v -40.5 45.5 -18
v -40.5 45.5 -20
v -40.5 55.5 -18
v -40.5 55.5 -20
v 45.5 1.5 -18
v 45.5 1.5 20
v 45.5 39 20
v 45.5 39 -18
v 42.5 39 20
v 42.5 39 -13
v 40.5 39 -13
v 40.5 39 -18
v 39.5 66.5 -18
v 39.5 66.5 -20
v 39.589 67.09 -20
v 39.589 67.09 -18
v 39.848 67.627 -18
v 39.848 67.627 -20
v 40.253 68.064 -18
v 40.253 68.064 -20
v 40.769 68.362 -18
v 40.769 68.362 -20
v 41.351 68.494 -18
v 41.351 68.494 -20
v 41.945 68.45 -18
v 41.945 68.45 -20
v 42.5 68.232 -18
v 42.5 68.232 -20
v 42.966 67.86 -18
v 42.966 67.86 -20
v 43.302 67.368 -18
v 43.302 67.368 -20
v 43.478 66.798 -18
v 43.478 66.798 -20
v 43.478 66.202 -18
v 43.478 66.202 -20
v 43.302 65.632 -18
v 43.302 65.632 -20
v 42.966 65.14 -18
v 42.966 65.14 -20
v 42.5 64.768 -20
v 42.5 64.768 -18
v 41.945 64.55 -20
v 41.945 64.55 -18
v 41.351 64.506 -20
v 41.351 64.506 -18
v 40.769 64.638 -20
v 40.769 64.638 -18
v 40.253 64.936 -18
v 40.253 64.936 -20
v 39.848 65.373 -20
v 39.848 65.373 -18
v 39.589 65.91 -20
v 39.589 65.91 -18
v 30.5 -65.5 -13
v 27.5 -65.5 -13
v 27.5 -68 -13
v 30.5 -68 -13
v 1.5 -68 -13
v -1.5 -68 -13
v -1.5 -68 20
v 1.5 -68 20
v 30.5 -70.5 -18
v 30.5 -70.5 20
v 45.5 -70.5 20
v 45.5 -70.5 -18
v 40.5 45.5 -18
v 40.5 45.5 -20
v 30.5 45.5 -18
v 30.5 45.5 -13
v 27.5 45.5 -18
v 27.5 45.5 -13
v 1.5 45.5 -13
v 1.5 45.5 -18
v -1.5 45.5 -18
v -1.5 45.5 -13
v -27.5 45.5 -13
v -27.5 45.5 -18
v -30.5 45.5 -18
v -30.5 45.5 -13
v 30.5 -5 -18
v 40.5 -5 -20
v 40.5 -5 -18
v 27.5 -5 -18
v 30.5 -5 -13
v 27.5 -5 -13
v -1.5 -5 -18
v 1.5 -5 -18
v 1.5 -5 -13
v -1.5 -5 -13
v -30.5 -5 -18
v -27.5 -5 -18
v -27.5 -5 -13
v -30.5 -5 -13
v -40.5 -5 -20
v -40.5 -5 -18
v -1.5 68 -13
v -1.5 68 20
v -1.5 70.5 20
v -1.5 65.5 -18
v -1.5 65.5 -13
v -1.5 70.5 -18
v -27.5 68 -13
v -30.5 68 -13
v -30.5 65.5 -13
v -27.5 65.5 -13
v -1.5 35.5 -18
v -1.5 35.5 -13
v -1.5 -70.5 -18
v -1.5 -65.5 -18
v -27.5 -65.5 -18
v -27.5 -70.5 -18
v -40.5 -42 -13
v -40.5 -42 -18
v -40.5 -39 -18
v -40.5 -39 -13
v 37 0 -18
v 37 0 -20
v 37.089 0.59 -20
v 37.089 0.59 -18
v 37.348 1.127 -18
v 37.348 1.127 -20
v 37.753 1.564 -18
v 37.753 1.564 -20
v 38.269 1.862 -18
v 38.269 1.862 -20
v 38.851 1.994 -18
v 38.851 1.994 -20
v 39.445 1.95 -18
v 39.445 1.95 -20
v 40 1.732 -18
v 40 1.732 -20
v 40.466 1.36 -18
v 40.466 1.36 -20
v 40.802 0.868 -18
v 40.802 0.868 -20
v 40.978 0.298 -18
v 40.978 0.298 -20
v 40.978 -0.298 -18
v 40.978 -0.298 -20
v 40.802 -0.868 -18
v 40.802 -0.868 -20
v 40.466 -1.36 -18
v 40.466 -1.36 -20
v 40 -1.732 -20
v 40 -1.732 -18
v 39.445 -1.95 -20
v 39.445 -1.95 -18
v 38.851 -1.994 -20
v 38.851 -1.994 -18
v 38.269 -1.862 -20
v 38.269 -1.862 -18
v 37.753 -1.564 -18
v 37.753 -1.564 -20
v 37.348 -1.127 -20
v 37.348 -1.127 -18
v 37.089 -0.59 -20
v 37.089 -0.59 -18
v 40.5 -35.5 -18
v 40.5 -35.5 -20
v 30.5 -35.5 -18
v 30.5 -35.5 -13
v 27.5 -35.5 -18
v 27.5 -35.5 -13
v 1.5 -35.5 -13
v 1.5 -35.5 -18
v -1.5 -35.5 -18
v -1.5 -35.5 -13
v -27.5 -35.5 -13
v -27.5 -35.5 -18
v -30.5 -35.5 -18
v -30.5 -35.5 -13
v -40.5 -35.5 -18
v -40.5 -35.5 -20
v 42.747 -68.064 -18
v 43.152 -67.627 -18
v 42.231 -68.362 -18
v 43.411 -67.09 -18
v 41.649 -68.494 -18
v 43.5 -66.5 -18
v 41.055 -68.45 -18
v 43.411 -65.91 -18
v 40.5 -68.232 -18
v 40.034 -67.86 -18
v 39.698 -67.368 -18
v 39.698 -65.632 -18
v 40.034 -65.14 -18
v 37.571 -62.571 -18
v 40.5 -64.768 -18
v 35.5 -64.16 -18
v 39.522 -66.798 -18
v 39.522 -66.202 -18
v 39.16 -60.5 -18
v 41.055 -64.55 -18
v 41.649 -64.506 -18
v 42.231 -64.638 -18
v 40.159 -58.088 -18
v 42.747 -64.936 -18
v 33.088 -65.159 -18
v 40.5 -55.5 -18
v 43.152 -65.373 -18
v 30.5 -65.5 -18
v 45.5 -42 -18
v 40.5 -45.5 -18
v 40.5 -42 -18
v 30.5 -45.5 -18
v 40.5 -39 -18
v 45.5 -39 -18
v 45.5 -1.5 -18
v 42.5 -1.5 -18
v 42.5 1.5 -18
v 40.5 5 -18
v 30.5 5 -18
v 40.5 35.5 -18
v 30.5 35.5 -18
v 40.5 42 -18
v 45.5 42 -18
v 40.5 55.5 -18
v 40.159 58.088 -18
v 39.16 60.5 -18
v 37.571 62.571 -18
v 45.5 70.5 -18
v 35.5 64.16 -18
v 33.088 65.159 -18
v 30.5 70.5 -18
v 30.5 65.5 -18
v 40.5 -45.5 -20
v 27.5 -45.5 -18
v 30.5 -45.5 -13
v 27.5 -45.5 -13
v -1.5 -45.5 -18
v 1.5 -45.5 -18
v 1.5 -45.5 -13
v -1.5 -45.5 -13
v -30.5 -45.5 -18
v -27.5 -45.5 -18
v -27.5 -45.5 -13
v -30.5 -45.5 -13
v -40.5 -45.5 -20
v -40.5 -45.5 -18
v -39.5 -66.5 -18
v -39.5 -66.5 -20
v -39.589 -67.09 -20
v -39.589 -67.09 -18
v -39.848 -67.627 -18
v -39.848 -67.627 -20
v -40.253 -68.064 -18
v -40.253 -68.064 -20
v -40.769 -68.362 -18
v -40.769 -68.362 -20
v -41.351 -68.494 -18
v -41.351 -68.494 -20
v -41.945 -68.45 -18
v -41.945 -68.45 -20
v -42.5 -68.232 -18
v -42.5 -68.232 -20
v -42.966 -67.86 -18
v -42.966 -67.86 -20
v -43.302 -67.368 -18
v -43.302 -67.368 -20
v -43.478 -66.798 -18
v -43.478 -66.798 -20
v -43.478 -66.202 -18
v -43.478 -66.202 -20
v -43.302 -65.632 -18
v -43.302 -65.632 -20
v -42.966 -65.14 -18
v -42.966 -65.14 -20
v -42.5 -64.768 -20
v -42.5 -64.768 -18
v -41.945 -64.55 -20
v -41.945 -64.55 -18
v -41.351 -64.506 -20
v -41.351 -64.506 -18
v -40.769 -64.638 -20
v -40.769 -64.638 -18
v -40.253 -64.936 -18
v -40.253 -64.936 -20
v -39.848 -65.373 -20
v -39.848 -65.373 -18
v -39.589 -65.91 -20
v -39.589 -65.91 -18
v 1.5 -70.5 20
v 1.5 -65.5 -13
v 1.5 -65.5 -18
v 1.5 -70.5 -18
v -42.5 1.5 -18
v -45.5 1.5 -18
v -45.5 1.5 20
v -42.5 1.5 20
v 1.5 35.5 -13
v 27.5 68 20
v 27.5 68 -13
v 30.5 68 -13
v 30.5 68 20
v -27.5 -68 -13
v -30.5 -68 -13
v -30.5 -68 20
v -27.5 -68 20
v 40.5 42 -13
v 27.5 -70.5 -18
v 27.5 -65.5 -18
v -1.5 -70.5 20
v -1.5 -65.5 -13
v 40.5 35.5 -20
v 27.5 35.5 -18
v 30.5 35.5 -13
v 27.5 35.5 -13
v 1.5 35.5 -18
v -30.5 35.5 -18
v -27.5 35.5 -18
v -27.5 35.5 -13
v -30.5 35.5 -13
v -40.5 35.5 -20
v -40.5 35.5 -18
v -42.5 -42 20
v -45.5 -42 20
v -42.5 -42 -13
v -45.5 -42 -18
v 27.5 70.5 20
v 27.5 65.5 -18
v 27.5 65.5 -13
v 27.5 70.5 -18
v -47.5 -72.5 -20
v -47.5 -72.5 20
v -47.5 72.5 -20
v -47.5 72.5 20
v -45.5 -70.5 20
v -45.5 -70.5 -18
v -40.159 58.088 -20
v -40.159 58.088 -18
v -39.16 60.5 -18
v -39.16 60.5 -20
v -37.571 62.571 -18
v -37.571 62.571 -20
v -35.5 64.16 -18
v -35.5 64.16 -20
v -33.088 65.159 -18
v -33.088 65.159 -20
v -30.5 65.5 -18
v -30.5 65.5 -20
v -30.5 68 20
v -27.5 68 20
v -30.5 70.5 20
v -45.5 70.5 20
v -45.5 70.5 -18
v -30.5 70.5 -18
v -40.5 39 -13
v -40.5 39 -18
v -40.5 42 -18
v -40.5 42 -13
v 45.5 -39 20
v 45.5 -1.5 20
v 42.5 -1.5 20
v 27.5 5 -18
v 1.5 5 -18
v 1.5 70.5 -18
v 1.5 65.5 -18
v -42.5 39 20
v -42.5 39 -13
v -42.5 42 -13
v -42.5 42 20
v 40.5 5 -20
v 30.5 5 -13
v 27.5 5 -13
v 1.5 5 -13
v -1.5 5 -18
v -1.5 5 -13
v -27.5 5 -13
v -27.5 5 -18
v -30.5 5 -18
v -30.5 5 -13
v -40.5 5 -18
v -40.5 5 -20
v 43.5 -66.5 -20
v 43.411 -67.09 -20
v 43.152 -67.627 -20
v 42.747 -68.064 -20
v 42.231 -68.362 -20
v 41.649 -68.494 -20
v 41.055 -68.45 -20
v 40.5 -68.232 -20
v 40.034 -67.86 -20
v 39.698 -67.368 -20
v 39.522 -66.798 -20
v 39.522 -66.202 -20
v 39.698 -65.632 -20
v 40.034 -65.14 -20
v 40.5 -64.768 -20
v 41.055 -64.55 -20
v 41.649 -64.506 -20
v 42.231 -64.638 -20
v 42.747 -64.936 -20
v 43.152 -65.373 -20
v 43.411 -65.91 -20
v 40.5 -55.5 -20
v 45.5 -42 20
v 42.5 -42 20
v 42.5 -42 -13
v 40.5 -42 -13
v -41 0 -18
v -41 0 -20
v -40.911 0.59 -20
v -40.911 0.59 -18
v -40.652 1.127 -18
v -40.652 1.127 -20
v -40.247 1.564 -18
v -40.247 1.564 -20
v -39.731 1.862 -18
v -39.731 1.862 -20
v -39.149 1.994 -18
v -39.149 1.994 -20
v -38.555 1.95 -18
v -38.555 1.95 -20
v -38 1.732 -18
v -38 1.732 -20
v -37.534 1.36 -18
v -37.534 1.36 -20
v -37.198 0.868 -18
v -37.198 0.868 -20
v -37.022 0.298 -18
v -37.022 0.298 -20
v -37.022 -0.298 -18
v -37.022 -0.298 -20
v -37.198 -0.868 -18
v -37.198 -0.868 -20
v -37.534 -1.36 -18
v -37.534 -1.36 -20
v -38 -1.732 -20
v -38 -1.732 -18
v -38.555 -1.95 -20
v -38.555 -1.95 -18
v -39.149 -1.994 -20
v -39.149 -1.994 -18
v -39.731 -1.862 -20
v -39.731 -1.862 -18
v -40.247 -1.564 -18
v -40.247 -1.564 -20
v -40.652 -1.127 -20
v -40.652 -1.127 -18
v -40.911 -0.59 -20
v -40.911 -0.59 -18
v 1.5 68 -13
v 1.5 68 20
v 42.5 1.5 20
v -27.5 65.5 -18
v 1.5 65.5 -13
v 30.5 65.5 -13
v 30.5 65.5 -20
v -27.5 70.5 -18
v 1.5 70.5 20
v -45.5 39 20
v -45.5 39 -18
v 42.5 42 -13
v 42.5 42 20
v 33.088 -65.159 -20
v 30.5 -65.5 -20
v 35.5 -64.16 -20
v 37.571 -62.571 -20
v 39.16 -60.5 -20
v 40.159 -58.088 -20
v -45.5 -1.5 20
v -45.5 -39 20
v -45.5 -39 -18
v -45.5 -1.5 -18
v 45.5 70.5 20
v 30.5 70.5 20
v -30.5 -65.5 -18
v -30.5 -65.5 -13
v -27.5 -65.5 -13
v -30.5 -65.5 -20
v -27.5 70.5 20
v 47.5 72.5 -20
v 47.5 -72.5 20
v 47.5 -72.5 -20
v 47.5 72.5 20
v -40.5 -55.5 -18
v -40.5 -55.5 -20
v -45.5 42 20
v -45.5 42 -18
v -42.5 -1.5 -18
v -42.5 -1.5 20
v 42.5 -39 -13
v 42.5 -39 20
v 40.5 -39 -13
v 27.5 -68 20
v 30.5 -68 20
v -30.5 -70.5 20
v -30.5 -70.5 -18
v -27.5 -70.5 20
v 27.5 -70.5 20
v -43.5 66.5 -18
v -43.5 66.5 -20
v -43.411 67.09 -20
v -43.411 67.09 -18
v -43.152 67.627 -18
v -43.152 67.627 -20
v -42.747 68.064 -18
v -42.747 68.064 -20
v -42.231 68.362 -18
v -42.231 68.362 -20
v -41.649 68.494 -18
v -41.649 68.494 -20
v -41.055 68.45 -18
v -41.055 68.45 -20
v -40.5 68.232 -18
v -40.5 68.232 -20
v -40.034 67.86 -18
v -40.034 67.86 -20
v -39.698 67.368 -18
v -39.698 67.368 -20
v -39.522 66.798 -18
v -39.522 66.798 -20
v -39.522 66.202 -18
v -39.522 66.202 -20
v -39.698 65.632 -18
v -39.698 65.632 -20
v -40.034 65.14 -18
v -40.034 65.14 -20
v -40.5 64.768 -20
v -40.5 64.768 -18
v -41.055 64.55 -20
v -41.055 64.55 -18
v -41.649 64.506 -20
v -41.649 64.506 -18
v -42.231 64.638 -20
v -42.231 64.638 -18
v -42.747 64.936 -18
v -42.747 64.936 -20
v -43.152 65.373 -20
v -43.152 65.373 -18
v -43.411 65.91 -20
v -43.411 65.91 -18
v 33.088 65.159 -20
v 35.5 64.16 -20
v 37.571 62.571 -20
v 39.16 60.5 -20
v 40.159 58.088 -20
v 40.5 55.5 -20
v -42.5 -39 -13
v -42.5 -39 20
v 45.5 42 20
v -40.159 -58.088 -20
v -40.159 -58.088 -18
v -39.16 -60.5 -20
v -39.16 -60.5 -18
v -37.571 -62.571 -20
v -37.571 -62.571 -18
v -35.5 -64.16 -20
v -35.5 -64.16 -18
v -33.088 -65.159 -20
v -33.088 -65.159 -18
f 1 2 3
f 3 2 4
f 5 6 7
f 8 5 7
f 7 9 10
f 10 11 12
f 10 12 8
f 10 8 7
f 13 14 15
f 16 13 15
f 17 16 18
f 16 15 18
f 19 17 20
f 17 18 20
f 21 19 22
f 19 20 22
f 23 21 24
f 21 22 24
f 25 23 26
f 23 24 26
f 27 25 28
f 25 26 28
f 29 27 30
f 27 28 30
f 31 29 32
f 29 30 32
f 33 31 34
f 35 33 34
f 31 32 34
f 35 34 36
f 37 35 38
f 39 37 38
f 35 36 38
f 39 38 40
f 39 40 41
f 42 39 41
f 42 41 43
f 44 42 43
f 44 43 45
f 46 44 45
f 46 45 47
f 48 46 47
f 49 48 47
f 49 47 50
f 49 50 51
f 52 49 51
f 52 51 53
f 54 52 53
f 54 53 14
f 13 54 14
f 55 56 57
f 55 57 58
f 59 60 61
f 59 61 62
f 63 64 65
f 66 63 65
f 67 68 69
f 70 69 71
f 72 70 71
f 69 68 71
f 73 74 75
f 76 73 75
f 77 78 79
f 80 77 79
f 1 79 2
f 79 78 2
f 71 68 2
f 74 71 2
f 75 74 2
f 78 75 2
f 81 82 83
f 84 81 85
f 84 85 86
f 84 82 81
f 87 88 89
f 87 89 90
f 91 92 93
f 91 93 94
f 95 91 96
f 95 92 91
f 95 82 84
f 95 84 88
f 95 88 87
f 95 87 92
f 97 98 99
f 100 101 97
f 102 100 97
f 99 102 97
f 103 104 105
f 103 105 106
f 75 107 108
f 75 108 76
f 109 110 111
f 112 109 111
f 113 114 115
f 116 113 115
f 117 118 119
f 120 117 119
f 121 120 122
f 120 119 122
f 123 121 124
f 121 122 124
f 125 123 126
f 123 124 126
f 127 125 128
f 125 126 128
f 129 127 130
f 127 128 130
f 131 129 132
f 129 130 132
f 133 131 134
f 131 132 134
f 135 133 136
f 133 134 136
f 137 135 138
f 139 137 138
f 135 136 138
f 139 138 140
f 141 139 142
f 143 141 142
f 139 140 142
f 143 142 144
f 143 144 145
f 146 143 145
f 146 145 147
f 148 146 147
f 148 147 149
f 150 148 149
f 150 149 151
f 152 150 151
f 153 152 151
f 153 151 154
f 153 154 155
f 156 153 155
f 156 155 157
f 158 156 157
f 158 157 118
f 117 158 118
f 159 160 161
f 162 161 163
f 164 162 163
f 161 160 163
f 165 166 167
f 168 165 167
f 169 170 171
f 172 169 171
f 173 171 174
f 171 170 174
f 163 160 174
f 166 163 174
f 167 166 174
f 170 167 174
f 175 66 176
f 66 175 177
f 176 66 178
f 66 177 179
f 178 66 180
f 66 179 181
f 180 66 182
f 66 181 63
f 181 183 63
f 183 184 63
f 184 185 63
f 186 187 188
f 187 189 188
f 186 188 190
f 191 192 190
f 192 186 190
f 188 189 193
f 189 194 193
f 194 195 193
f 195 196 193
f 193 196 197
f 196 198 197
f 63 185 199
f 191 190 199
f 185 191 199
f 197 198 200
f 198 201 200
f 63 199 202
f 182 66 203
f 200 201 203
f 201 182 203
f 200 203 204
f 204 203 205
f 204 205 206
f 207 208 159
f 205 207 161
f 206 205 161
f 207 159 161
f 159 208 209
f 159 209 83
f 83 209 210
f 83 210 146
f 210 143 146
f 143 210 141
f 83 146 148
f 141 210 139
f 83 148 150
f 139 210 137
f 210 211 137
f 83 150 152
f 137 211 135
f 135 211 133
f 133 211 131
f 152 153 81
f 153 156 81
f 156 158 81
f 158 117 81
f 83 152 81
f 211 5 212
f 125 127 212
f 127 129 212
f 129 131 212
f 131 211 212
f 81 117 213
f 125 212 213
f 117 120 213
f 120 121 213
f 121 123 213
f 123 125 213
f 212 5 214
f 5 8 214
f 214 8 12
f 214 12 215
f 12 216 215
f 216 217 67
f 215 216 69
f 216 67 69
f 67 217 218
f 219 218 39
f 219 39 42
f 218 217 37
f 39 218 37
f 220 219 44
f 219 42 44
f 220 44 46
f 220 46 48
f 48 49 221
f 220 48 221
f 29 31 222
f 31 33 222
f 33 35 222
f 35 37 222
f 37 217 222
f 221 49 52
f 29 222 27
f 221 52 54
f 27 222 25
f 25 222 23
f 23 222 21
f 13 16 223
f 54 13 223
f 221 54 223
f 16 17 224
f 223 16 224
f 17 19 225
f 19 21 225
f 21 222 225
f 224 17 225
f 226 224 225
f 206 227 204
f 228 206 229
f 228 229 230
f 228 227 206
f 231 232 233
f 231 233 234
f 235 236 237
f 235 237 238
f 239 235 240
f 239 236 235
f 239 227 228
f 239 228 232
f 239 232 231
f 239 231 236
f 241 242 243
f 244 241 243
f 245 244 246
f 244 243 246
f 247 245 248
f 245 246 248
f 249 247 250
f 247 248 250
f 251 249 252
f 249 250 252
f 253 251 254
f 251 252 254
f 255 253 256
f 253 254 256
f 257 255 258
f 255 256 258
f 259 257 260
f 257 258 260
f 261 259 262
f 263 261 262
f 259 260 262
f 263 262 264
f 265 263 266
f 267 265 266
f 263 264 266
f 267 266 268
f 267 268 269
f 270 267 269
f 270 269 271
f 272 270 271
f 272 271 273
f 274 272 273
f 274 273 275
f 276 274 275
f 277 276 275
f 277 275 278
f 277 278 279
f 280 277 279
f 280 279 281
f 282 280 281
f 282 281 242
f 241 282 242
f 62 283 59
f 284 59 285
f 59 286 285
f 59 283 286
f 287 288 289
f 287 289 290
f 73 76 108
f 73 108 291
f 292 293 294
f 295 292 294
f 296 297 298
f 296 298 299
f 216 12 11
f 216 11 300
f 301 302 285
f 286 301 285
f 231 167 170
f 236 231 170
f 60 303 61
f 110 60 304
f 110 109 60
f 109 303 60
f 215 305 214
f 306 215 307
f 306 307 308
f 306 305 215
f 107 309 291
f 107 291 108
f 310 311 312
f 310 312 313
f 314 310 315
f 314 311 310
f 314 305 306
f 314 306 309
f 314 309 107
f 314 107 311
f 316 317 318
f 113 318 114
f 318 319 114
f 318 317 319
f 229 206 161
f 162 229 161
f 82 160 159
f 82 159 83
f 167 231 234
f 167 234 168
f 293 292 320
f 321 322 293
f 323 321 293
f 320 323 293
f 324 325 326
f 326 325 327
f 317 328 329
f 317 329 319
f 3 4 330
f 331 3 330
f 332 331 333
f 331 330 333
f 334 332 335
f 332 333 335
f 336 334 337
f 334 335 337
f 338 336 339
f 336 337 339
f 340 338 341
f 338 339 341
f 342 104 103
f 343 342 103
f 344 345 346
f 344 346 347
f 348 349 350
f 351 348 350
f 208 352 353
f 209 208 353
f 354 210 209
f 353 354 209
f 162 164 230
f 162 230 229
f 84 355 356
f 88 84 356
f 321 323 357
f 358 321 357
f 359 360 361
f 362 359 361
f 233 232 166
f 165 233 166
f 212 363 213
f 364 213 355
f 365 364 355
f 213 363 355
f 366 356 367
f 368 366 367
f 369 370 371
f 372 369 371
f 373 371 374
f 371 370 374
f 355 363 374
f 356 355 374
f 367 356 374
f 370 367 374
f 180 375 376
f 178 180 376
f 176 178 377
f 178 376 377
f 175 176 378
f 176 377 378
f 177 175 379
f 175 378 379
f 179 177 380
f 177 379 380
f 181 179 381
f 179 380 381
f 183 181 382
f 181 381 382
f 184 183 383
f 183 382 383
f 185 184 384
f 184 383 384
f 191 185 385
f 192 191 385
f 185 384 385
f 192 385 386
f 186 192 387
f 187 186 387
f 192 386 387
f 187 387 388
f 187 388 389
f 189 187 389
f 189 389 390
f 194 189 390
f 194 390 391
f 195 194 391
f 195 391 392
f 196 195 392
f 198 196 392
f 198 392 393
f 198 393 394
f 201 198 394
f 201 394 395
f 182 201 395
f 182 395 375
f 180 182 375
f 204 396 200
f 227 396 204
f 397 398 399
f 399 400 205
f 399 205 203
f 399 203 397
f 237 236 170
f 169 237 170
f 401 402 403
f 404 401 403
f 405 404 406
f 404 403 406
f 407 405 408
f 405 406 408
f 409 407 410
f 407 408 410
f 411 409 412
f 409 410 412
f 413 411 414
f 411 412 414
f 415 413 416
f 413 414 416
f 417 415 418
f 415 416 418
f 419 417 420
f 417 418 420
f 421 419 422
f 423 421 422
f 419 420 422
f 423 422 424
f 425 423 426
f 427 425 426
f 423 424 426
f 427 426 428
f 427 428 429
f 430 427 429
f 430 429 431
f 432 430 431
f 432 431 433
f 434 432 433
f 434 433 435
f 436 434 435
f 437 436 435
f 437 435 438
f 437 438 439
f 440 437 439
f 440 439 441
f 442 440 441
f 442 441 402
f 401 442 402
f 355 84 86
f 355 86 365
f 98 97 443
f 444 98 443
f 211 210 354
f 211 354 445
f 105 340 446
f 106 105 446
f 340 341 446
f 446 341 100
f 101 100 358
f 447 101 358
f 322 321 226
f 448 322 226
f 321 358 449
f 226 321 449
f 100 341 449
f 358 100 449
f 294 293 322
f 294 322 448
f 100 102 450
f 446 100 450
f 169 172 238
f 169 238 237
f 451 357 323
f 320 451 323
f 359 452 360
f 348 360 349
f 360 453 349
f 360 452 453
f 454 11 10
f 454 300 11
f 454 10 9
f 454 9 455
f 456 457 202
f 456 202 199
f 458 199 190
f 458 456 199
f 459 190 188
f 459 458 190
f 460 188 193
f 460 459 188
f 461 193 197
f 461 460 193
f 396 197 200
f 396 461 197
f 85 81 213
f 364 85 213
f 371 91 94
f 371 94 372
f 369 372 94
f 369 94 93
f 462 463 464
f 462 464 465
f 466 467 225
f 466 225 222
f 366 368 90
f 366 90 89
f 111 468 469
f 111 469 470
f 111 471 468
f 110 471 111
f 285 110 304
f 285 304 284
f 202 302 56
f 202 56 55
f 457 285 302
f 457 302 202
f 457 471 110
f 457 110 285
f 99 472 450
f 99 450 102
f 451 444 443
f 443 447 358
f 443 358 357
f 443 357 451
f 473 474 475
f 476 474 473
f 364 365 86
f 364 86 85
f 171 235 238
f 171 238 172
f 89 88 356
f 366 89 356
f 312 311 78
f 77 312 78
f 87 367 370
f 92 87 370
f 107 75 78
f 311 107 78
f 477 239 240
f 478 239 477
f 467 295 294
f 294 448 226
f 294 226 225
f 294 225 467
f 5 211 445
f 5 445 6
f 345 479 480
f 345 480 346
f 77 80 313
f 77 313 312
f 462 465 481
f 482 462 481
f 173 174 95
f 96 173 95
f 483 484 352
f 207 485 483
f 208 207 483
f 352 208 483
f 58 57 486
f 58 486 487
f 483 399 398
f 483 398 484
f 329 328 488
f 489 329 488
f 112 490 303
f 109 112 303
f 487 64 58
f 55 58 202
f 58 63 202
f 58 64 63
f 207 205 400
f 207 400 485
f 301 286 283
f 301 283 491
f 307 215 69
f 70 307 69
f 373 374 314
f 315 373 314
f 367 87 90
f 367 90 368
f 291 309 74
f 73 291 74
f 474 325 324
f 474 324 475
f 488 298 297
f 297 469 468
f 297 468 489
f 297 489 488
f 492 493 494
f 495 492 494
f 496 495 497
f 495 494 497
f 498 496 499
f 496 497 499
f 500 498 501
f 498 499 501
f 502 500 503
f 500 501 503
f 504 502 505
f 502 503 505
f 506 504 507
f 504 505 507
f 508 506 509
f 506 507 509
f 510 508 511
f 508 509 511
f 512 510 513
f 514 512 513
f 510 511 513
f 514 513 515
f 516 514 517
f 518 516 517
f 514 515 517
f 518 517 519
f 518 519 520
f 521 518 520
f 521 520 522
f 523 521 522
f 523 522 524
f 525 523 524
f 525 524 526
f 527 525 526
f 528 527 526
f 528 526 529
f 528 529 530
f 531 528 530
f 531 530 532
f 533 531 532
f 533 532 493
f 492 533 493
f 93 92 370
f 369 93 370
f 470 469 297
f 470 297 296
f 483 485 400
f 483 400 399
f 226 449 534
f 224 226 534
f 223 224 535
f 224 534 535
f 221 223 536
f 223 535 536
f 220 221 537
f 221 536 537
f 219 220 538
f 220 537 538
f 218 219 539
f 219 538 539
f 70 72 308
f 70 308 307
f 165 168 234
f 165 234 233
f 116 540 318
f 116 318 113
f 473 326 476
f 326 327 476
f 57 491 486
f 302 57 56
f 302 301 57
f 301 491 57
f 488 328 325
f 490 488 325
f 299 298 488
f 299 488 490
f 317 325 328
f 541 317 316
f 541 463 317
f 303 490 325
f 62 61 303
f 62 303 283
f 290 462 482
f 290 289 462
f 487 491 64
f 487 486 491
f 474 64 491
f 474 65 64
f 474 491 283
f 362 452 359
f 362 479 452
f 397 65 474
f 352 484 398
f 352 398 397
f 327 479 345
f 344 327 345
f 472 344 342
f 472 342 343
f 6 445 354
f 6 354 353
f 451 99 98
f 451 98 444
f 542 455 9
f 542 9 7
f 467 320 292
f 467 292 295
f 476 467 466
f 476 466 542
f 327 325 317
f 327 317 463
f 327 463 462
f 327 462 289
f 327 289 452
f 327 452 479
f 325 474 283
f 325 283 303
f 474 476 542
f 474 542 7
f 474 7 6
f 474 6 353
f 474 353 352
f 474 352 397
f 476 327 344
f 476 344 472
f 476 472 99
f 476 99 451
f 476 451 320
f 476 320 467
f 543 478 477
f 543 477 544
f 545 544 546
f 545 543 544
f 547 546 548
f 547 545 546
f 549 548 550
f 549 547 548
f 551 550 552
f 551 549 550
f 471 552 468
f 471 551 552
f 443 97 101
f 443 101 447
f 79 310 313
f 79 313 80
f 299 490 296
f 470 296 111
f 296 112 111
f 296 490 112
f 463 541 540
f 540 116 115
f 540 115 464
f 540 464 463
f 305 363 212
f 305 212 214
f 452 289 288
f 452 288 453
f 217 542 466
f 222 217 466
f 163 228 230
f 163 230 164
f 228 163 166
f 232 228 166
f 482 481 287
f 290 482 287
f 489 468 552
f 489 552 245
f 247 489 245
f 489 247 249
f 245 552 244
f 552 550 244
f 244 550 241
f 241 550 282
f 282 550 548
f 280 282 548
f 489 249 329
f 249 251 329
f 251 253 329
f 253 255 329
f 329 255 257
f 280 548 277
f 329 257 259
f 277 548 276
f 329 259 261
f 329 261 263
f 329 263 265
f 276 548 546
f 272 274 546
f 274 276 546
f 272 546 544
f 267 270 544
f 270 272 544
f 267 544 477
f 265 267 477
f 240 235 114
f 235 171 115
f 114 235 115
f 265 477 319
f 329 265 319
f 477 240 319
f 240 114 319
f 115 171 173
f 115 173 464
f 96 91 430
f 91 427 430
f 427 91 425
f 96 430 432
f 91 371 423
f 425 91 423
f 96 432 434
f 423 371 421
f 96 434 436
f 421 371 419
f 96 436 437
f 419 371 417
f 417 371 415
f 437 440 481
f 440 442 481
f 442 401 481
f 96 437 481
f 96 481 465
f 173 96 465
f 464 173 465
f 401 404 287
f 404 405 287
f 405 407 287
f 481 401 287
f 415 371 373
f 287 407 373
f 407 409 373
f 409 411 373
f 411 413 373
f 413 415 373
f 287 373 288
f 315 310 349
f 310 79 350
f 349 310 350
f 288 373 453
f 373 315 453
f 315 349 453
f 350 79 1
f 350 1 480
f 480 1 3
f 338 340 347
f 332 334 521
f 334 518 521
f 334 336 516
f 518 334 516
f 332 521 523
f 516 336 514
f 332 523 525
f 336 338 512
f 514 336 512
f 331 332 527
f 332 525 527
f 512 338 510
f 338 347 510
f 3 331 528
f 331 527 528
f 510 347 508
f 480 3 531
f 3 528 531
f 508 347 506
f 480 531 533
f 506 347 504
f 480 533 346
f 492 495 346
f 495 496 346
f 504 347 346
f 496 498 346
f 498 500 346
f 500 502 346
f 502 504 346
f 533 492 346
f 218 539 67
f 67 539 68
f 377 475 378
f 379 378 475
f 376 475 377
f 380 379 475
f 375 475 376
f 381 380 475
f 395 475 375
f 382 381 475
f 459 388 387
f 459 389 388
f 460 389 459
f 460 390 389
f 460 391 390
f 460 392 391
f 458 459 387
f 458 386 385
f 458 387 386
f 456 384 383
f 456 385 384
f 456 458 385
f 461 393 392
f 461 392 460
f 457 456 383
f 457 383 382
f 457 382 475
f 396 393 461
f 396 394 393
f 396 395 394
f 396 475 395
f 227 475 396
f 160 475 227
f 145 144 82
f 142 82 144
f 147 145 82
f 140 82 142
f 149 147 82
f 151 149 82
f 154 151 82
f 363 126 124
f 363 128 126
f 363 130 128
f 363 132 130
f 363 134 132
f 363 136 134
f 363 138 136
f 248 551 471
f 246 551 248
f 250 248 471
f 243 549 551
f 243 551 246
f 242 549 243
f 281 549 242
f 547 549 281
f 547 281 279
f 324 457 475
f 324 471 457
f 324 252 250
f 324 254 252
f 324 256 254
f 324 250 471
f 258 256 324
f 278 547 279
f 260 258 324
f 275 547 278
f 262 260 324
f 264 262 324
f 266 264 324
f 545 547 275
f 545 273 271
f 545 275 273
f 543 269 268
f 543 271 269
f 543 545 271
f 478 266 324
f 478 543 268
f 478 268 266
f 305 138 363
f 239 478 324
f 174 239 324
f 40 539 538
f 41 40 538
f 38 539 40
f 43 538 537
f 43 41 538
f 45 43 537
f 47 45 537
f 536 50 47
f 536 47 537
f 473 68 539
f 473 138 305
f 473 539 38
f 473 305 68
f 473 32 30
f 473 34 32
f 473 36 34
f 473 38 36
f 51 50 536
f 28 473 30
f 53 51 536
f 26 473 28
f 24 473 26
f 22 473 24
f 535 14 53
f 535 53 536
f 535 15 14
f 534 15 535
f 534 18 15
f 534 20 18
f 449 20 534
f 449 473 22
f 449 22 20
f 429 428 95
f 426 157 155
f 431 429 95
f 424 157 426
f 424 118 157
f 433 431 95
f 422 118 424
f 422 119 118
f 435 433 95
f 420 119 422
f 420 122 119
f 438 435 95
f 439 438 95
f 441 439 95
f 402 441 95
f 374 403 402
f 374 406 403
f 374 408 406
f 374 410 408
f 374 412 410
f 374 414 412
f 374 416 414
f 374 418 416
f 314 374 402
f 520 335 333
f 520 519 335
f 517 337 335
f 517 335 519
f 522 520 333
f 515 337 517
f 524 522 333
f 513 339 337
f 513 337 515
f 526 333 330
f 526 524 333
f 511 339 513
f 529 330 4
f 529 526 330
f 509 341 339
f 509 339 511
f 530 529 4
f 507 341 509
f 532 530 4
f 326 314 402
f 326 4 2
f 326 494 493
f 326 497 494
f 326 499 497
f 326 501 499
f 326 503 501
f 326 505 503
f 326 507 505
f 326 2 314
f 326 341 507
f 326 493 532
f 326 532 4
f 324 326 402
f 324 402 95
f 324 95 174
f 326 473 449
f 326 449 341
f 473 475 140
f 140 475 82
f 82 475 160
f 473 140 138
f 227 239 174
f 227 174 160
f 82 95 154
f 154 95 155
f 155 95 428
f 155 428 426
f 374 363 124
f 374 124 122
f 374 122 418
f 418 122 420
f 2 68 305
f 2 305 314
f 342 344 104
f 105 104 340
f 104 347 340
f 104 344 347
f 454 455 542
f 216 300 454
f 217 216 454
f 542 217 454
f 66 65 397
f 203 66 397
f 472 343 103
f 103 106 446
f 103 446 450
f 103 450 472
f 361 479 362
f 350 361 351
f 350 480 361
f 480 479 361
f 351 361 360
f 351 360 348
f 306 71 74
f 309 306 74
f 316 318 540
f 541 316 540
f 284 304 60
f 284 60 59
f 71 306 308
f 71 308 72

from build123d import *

# Parameters (mm, degrees)
SKETCH1_W           = 95
SKETCH1_H           = 145
BOSS_EXTRUDE1_DEPTH = 20
SKETCH2_W           = 91
SKETCH2_H           = 141
CUT_EXTRUDE1_DEPTH  = 40
SKETCH3_W           = 91
SKETCH3_H           = 141
SKETCH3_W_2         = 81
SKETCH3_H_2         = 30.5
BOSS_EXTRUDE2_DEPTH = 2
CUT_EXTRUDE2_REACH  = 97.459
SKETCH4_R           = 2
SKETCH6_W           = 3
SKETCH6_H           = 2.5
SKETCH6_H_2         = 3
SKETCH6_W_2         = 2
SKETCH6_H_3         = 10
BOSS_EXTRUDE3_DEPTH = 5
SKETCH7_W           = 3
SKETCH7_H           = 3
SKETCH7_H_2         = 2.5
BOSS_EXTRUDE4_DEPTH = 33


with BuildPart() as part:
    # Sketch1 → Boss-Extrude1 (new, symmetric)
    with BuildSketch(Plane.XY):
        Rectangle(SKETCH1_W, SKETCH1_H)
    extrude(amount=BOSS_EXTRUDE1_DEPTH, both=True)

    # Sketch2 → Cut-Extrude1 (cut)
    with BuildSketch(Plane.XY.offset(20)):
        Rectangle(SKETCH2_W, SKETCH2_H)
    extrude(amount=-CUT_EXTRUDE1_DEPTH, mode=Mode.SUBTRACT)

    # Sketch3 → Boss-Extrude2 (add)
    with BuildSketch(Plane(origin=(0, 0, -20), x_dir=(-1, 0, 0), z_dir=(0, 0, -1))):
        Rectangle(SKETCH3_W, SKETCH3_H)
        with Locations((0, -20.25)):
            Rectangle(SKETCH3_W_2, SKETCH3_H_2, mode=Mode.SUBTRACT)
        with BuildLine():
            Line((-40.5, -45.5), (40.5, -45.5))
            Line((40.5, -45.5), (40.5, -55.5))
            ThreePointArc((40.5, -55.5), (37.571067812, -62.571067812), (30.5, -65.5))
            Line((30.5, -65.5), (-30.5, -65.5))
            ThreePointArc((-30.5, -65.5), (-37.571067812, -62.571067812), (-40.5, -55.5))
            Line((-40.5, -55.5), (-40.5, -45.5))
        make_face(mode=Mode.SUBTRACT)
        with Locations((0, 20.25)):
            Rectangle(SKETCH3_W_2, SKETCH3_H_2, mode=Mode.SUBTRACT)
        with BuildLine():
            Line((30.5, 65.5), (-30.5, 65.5))
            ThreePointArc((-30.5, 65.5), (-37.571067812, 62.571067812), (-40.5, 55.5))
            Line((-40.5, 55.5), (-40.5, 45.5))
            Line((-40.5, 45.5), (40.5, 45.5))
            Line((40.5, 45.5), (40.5, 55.5))
            ThreePointArc((40.5, 55.5), (37.571067812, 62.571067812), (30.5, 65.5))
        make_face(mode=Mode.SUBTRACT)
    extrude(amount=-BOSS_EXTRUDE2_DEPTH)

    # Sketch4 → Cut-Extrude2 (cut, up to next)
    with BuildSketch(Plane(origin=(0, 0, -20), x_dir=(-1, 0, 0), z_dir=(0, 0, -1)), mode=Mode.PRIVATE) as cut_extrude2_sk1:
        with Locations((-41.5, 66.5)):
            Circle(SKETCH4_R)
    cut_extrude2_tool1 = extrude(cut_extrude2_sk1.sketch, amount=-CUT_EXTRUDE2_REACH, mode=Mode.PRIVATE) & part.part
    # Sketch4 → Cut-Extrude2 (cut, up to next)
    with BuildSketch(Plane(origin=(0, 0, -20), x_dir=(-1, 0, 0), z_dir=(0, 0, -1)), mode=Mode.PRIVATE) as cut_extrude2_sk2:
        with Locations((41.5, 66.5)):
            Circle(SKETCH4_R)
    cut_extrude2_tool2 = extrude(cut_extrude2_sk2.sketch, amount=-CUT_EXTRUDE2_REACH, mode=Mode.PRIVATE) & part.part
    # Sketch4 → Cut-Extrude2 (cut, up to next)
    with BuildSketch(Plane(origin=(0, 0, -20), x_dir=(-1, 0, 0), z_dir=(0, 0, -1)), mode=Mode.PRIVATE) as cut_extrude2_sk3:
        with Locations(Location((41.5, -66.5, 0), (0, 0, 180))):
            Circle(SKETCH4_R)
    cut_extrude2_tool3 = extrude(cut_extrude2_sk3.sketch, amount=-CUT_EXTRUDE2_REACH, mode=Mode.PRIVATE) & part.part
    # Sketch4 → Cut-Extrude2 (cut, up to next)
    with BuildSketch(Plane(origin=(0, 0, -20), x_dir=(-1, 0, 0), z_dir=(0, 0, -1)), mode=Mode.PRIVATE) as cut_extrude2_sk4:
        with Locations(Location((-41.5, -66.5, 0), (0, 0, 180))):
            Circle(SKETCH4_R)
    cut_extrude2_tool4 = extrude(cut_extrude2_sk4.sketch, amount=-CUT_EXTRUDE2_REACH, mode=Mode.PRIVATE) & part.part
    # Sketch4 → Cut-Extrude2 (cut, up to next)
    with BuildSketch(Plane(origin=(0, 0, -20), x_dir=(-1, 0, 0), z_dir=(0, 0, -1)), mode=Mode.PRIVATE) as cut_extrude2_sk5:
        with Locations((-39, 0)):
            Circle(SKETCH4_R)
    cut_extrude2_tool5 = extrude(cut_extrude2_sk5.sketch, amount=-CUT_EXTRUDE2_REACH, mode=Mode.PRIVATE) & part.part
    # Sketch4 → Cut-Extrude2 (cut, up to next)
    with BuildSketch(Plane(origin=(0, 0, -20), x_dir=(-1, 0, 0), z_dir=(0, 0, -1)), mode=Mode.PRIVATE) as cut_extrude2_sk6:
        with Locations((39, 0)):
            Circle(SKETCH4_R)
    cut_extrude2_tool6 = extrude(cut_extrude2_sk6.sketch, amount=-CUT_EXTRUDE2_REACH, mode=Mode.PRIVATE) & part.part
    add(cut_extrude2_tool1.solids().sort_by_distance((41.5, 66.5, -20))[0], mode=Mode.SUBTRACT)
    add(cut_extrude2_tool2.solids().sort_by_distance((-41.5, 66.5, -20))[0], mode=Mode.SUBTRACT)
    add(cut_extrude2_tool3.solids().sort_by_distance((-41.5, -66.5, -20))[0], mode=Mode.SUBTRACT)
    add(cut_extrude2_tool4.solids().sort_by_distance((41.5, -66.5, -20))[0], mode=Mode.SUBTRACT)
    add(cut_extrude2_tool5.solids().sort_by_distance((39, 0, -20))[0], mode=Mode.SUBTRACT)
    add(cut_extrude2_tool6.solids().sort_by_distance((-39, 0, -20))[0], mode=Mode.SUBTRACT)

    # Sketch6 → Boss-Extrude3 (add)
    with BuildSketch(Plane.XY.offset(-18)):
        with Locations((-29, 69.25)):
            Rectangle(SKETCH6_W, SKETCH6_H)
        with Locations((-29, 66.75)):
            Rectangle(SKETCH6_W, SKETCH6_H)
        with Locations((0, 66.75)):
            Rectangle(SKETCH6_W, SKETCH6_H)
        with Locations((0, 69.25)):
            Rectangle(SKETCH6_W, SKETCH6_H)
        with Locations((29, 69.25)):
            Rectangle(SKETCH6_W, SKETCH6_H)
        with Locations((29, 66.75)):
            Rectangle(SKETCH6_W, SKETCH6_H)
        with Locations((44, 40.5)):
            Rectangle(SKETCH6_W, SKETCH6_H_2)
        with Locations((41.5, 40.5)):
            Rectangle(SKETCH6_W_2, SKETCH6_H_2)
        with Locations((29, 40.5)):
            Rectangle(SKETCH6_W, SKETCH6_H_3)
        with Locations((-29, 40.5)):
            Rectangle(SKETCH6_W, SKETCH6_H_3)
        with Locations((-44, 40.5)):
            Rectangle(SKETCH6_W, SKETCH6_H_2)
        with Locations((-41.5, 40.5)):
            Rectangle(SKETCH6_W_2, SKETCH6_H_2)
        with Locations((44, 0)):
            Rectangle(SKETCH6_W, SKETCH6_H_2)
        with Locations((29, 0)):
            Rectangle(SKETCH6_W, SKETCH6_H_3)
        with Locations((-29, 0)):
            Rectangle(SKETCH6_W, SKETCH6_H_3)
        with Locations((-44, 0)):
            Rectangle(SKETCH6_W, SKETCH6_H_2)
        with Locations((-44, -40.5)):
            Rectangle(SKETCH6_W, SKETCH6_H_2)
        with Locations((-41.5, -40.5)):
            Rectangle(SKETCH6_W_2, SKETCH6_H_2)
        with Locations((-29, -40.5)):
            Rectangle(SKETCH6_W, SKETCH6_H_3)
        with Locations((29, -40.5)):
            Rectangle(SKETCH6_W, SKETCH6_H_3)
        with Locations((41.5, -40.5)):
            Rectangle(SKETCH6_W_2, SKETCH6_H_2)
        with Locations((44, -40.5)):
            Rectangle(SKETCH6_W, SKETCH6_H_2)
        with Locations((-29, -69.25)):
            Rectangle(SKETCH6_W, SKETCH6_H)
        with Locations((-29, -66.75)):
            Rectangle(SKETCH6_W, SKETCH6_H)
        with Locations((0, -66.75)):
            Rectangle(SKETCH6_W, SKETCH6_H)
        with Locations((0, -69.25)):
            Rectangle(SKETCH6_W, SKETCH6_H)
        with Locations((29, -69.25)):
            Rectangle(SKETCH6_W, SKETCH6_H)
        with Locations((29, -66.75)):
            Rectangle(SKETCH6_W, SKETCH6_H)
        with Locations((0, 40.5)):
            Rectangle(SKETCH6_W, SKETCH6_H_3)
        Rectangle(SKETCH6_W, SKETCH6_H_3)
        with Locations((0, -40.5)):
            Rectangle(SKETCH6_W, SKETCH6_H_3)
    extrude(amount=BOSS_EXTRUDE3_DEPTH)

    # Sketch7 → Boss-Extrude4 (add)
    with BuildSketch(Plane.XY.offset(-13)):
        with Locations((-44, 40.5)):
            Rectangle(SKETCH7_W, SKETCH7_H)
        with Locations((-29, 69.25)):
            Rectangle(SKETCH7_W, SKETCH7_H_2)
        with Locations((-44, 0)):
            Rectangle(SKETCH7_W, SKETCH7_H)
        with Locations((-44, -40.5)):
            Rectangle(SKETCH7_W, SKETCH7_H)
        with Locations((-29, -69.25)):
            Rectangle(SKETCH7_W, SKETCH7_H_2)
        with Locations((0, -69.25)):
            Rectangle(SKETCH7_W, SKETCH7_H_2)
        with Locations((29, -69.25)):
            Rectangle(SKETCH7_W, SKETCH7_H_2)
        with Locations((44, -40.5)):
            Rectangle(SKETCH7_W, SKETCH7_H)
        with Locations((44, 0)):
            Rectangle(SKETCH7_W, SKETCH7_H)
        with Locations((44, 40.5)):
            Rectangle(SKETCH7_W, SKETCH7_H)
        with Locations((29, 69.25)):
            Rectangle(SKETCH7_W, SKETCH7_H_2)
        with Locations((0, 69.25)):
            Rectangle(SKETCH7_W, SKETCH7_H_2)
    extrude(amount=BOSS_EXTRUDE4_DEPTH)


solid = part.part
